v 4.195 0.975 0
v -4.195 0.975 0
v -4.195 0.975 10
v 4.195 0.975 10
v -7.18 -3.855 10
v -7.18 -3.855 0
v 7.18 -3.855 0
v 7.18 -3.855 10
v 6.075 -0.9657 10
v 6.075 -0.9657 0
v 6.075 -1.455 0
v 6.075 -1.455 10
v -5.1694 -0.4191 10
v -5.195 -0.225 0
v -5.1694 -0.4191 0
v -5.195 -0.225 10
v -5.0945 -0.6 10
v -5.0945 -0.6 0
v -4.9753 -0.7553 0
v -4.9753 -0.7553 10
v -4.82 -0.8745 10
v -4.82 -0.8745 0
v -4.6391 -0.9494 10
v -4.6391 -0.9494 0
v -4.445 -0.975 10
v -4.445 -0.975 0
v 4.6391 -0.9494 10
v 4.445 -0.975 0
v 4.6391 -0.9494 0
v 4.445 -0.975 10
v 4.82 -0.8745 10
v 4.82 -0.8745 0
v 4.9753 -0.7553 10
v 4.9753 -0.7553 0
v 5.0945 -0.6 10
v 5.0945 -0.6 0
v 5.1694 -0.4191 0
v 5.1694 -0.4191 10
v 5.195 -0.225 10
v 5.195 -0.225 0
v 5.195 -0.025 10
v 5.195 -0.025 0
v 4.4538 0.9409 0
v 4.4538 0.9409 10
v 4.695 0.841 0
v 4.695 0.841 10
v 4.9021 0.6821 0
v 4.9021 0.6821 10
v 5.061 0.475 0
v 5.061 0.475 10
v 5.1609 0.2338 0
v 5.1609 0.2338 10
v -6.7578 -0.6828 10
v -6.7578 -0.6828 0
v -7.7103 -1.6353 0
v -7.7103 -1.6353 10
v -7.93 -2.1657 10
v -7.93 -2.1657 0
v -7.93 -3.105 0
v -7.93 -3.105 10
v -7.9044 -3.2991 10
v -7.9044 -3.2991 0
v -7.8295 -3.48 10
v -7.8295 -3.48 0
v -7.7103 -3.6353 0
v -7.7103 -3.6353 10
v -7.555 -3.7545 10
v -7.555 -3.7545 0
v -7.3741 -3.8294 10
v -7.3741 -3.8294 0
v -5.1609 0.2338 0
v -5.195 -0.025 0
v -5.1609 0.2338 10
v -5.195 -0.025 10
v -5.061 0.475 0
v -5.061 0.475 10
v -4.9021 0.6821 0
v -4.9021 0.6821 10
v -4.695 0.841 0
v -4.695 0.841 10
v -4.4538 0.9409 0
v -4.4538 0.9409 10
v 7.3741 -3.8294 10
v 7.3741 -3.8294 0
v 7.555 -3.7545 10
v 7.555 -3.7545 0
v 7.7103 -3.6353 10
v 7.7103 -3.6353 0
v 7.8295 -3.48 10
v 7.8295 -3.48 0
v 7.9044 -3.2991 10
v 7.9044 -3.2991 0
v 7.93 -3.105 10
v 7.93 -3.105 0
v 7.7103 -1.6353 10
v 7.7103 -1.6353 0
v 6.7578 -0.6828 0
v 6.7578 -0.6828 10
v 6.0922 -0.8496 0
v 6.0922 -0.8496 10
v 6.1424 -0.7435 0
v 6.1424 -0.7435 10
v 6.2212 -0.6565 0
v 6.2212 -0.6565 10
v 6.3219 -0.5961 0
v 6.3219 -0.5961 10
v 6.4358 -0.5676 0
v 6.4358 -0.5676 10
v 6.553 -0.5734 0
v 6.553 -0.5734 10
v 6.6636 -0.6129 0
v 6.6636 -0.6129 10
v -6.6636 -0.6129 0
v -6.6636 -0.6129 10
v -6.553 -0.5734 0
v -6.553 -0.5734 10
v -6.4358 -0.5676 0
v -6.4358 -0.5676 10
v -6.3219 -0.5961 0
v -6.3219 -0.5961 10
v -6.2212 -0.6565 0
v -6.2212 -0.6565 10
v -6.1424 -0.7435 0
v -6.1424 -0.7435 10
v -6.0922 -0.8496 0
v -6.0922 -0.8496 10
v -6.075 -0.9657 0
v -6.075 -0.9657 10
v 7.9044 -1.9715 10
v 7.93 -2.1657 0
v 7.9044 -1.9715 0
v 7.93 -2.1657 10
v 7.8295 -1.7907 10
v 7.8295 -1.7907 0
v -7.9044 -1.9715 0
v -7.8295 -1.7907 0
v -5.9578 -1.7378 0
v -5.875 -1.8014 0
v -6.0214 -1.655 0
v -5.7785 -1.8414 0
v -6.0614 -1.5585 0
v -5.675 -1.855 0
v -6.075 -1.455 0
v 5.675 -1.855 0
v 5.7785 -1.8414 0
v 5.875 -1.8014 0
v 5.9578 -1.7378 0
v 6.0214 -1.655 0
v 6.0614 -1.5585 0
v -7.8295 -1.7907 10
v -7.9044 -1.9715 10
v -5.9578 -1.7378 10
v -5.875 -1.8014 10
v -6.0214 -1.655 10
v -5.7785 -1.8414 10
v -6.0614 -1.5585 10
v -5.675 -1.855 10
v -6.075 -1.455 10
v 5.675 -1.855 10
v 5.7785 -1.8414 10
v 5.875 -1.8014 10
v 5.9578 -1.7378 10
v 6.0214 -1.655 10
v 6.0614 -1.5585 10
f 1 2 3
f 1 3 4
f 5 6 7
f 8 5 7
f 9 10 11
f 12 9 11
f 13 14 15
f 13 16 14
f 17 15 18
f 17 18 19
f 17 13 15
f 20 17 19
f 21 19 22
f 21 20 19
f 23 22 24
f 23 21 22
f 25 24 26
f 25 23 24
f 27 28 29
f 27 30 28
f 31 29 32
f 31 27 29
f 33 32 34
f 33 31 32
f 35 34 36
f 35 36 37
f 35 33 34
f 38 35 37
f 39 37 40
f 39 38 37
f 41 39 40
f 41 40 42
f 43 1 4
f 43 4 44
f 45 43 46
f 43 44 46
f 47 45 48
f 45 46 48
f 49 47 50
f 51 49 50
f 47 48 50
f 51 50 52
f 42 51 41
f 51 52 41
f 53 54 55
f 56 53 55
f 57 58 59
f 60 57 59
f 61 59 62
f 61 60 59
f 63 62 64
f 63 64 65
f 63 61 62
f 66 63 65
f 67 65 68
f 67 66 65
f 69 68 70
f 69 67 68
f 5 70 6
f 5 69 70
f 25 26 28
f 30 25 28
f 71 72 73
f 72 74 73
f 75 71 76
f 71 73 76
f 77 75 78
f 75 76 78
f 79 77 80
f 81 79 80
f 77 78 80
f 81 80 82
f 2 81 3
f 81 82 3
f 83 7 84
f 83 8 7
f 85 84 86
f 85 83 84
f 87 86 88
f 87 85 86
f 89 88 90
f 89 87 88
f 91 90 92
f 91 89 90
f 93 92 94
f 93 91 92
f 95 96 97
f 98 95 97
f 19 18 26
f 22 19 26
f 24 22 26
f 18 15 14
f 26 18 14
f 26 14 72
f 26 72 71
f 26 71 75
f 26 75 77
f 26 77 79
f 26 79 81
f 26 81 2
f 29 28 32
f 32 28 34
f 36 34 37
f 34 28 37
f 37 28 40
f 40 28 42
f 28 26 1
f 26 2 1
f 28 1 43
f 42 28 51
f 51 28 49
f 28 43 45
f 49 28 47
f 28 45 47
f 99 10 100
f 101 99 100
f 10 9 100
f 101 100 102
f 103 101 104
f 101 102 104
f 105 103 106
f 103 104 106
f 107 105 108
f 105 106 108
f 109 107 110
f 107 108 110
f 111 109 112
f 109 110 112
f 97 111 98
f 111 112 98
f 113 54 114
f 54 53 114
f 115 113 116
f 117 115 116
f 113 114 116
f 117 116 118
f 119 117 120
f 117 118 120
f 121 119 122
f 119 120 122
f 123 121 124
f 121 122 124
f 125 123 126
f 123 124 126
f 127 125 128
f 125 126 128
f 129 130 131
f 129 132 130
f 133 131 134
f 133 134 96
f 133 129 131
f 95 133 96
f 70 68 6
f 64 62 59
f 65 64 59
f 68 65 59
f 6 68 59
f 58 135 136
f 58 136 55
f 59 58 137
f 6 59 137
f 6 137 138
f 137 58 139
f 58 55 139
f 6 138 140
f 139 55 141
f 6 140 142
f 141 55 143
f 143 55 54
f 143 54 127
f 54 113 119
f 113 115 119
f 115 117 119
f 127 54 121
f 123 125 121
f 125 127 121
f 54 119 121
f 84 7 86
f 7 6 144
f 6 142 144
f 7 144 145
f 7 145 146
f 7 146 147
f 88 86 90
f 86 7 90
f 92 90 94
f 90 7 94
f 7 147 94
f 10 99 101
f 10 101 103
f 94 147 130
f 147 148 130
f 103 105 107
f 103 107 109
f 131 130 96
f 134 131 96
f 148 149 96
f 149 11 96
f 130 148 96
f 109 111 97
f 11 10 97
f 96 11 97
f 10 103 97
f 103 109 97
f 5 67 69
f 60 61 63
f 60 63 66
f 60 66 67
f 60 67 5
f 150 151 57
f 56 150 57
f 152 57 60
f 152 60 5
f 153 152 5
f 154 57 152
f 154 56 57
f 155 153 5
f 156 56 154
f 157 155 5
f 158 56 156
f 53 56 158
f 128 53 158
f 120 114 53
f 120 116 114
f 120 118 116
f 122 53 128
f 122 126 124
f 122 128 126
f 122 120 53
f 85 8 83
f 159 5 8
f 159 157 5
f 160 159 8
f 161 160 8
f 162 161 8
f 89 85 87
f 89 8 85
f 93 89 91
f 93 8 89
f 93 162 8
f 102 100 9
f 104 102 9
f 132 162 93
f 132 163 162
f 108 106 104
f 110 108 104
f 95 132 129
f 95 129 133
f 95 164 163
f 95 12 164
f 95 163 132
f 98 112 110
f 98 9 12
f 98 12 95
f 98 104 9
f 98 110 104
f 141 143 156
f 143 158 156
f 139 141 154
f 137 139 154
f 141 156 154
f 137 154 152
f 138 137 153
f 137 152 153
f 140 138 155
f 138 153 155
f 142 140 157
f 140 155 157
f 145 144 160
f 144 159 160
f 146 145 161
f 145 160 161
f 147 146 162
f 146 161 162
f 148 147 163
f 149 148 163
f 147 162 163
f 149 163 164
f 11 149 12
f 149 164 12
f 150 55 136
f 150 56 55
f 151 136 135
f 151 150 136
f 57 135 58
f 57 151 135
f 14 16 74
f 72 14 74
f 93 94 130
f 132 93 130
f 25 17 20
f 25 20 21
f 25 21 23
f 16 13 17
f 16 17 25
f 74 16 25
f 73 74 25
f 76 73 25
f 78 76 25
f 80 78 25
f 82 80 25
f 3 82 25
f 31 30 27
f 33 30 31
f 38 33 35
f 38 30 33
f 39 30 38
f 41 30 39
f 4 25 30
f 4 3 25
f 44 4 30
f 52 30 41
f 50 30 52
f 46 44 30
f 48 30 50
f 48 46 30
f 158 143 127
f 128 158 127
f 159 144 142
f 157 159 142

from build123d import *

# Parameters (mm, degrees)
F0_W     = 10.39
F0_H     = 1.95
F1_DEPTH = 10
F2_R     = 0.75
F3_R     = 0.4
F4_R     = 1


with BuildPart() as f1:
    # F0 (on Top) → F1 (new body)
    with BuildSketch(Plane.XY):
        Rectangle(F0_W, F0_H)
        Polygon((-7.93, -1.855), (-6.075, -1.855), (-6.075, 0), align=None)
        Polygon((7.93, -1.855), (6.075, -1.855), (-6.075, -1.855), (-7.93, -1.855), (-7.93, -3.855), (7.93, -3.855), align=None)
        Polygon((6.075, 0), (6.075, -1.855), (7.93, -1.855), align=None)
    extrude(amount=F1_DEPTH)

    # F2
    f2_edges = [f1.edges().sort_by_distance(p)[0] for p in [
        (-5.195, -0.975, 5),
        (5.195, -0.975, 5),
        (-7.93, -3.855, 5),
        (7.93, -3.855, 5),
        (7.93, -1.855, 5),
        (-7.93, -1.855, 5),
    ]]
    fillet(f2_edges, radius=F2_R)

    # F3
    f3_edges = [f1.edges().sort_by_distance(p)[0] for p in [
        (-6.075, 0, 5),
        (6.075, 0, 5),
        (6.075, -1.855, 5),
        (-6.075, -1.855, 5),
    ]]
    fillet(f3_edges, radius=F3_R)

    # F4
    f4_edges = [f1.edges().sort_by_distance(p)[0] for p in [
        (-5.195, 0.975, 5),
        (5.195, 0.975, 5),
    ]]
    fillet(f4_edges, radius=F4_R)


solid = f1.part
